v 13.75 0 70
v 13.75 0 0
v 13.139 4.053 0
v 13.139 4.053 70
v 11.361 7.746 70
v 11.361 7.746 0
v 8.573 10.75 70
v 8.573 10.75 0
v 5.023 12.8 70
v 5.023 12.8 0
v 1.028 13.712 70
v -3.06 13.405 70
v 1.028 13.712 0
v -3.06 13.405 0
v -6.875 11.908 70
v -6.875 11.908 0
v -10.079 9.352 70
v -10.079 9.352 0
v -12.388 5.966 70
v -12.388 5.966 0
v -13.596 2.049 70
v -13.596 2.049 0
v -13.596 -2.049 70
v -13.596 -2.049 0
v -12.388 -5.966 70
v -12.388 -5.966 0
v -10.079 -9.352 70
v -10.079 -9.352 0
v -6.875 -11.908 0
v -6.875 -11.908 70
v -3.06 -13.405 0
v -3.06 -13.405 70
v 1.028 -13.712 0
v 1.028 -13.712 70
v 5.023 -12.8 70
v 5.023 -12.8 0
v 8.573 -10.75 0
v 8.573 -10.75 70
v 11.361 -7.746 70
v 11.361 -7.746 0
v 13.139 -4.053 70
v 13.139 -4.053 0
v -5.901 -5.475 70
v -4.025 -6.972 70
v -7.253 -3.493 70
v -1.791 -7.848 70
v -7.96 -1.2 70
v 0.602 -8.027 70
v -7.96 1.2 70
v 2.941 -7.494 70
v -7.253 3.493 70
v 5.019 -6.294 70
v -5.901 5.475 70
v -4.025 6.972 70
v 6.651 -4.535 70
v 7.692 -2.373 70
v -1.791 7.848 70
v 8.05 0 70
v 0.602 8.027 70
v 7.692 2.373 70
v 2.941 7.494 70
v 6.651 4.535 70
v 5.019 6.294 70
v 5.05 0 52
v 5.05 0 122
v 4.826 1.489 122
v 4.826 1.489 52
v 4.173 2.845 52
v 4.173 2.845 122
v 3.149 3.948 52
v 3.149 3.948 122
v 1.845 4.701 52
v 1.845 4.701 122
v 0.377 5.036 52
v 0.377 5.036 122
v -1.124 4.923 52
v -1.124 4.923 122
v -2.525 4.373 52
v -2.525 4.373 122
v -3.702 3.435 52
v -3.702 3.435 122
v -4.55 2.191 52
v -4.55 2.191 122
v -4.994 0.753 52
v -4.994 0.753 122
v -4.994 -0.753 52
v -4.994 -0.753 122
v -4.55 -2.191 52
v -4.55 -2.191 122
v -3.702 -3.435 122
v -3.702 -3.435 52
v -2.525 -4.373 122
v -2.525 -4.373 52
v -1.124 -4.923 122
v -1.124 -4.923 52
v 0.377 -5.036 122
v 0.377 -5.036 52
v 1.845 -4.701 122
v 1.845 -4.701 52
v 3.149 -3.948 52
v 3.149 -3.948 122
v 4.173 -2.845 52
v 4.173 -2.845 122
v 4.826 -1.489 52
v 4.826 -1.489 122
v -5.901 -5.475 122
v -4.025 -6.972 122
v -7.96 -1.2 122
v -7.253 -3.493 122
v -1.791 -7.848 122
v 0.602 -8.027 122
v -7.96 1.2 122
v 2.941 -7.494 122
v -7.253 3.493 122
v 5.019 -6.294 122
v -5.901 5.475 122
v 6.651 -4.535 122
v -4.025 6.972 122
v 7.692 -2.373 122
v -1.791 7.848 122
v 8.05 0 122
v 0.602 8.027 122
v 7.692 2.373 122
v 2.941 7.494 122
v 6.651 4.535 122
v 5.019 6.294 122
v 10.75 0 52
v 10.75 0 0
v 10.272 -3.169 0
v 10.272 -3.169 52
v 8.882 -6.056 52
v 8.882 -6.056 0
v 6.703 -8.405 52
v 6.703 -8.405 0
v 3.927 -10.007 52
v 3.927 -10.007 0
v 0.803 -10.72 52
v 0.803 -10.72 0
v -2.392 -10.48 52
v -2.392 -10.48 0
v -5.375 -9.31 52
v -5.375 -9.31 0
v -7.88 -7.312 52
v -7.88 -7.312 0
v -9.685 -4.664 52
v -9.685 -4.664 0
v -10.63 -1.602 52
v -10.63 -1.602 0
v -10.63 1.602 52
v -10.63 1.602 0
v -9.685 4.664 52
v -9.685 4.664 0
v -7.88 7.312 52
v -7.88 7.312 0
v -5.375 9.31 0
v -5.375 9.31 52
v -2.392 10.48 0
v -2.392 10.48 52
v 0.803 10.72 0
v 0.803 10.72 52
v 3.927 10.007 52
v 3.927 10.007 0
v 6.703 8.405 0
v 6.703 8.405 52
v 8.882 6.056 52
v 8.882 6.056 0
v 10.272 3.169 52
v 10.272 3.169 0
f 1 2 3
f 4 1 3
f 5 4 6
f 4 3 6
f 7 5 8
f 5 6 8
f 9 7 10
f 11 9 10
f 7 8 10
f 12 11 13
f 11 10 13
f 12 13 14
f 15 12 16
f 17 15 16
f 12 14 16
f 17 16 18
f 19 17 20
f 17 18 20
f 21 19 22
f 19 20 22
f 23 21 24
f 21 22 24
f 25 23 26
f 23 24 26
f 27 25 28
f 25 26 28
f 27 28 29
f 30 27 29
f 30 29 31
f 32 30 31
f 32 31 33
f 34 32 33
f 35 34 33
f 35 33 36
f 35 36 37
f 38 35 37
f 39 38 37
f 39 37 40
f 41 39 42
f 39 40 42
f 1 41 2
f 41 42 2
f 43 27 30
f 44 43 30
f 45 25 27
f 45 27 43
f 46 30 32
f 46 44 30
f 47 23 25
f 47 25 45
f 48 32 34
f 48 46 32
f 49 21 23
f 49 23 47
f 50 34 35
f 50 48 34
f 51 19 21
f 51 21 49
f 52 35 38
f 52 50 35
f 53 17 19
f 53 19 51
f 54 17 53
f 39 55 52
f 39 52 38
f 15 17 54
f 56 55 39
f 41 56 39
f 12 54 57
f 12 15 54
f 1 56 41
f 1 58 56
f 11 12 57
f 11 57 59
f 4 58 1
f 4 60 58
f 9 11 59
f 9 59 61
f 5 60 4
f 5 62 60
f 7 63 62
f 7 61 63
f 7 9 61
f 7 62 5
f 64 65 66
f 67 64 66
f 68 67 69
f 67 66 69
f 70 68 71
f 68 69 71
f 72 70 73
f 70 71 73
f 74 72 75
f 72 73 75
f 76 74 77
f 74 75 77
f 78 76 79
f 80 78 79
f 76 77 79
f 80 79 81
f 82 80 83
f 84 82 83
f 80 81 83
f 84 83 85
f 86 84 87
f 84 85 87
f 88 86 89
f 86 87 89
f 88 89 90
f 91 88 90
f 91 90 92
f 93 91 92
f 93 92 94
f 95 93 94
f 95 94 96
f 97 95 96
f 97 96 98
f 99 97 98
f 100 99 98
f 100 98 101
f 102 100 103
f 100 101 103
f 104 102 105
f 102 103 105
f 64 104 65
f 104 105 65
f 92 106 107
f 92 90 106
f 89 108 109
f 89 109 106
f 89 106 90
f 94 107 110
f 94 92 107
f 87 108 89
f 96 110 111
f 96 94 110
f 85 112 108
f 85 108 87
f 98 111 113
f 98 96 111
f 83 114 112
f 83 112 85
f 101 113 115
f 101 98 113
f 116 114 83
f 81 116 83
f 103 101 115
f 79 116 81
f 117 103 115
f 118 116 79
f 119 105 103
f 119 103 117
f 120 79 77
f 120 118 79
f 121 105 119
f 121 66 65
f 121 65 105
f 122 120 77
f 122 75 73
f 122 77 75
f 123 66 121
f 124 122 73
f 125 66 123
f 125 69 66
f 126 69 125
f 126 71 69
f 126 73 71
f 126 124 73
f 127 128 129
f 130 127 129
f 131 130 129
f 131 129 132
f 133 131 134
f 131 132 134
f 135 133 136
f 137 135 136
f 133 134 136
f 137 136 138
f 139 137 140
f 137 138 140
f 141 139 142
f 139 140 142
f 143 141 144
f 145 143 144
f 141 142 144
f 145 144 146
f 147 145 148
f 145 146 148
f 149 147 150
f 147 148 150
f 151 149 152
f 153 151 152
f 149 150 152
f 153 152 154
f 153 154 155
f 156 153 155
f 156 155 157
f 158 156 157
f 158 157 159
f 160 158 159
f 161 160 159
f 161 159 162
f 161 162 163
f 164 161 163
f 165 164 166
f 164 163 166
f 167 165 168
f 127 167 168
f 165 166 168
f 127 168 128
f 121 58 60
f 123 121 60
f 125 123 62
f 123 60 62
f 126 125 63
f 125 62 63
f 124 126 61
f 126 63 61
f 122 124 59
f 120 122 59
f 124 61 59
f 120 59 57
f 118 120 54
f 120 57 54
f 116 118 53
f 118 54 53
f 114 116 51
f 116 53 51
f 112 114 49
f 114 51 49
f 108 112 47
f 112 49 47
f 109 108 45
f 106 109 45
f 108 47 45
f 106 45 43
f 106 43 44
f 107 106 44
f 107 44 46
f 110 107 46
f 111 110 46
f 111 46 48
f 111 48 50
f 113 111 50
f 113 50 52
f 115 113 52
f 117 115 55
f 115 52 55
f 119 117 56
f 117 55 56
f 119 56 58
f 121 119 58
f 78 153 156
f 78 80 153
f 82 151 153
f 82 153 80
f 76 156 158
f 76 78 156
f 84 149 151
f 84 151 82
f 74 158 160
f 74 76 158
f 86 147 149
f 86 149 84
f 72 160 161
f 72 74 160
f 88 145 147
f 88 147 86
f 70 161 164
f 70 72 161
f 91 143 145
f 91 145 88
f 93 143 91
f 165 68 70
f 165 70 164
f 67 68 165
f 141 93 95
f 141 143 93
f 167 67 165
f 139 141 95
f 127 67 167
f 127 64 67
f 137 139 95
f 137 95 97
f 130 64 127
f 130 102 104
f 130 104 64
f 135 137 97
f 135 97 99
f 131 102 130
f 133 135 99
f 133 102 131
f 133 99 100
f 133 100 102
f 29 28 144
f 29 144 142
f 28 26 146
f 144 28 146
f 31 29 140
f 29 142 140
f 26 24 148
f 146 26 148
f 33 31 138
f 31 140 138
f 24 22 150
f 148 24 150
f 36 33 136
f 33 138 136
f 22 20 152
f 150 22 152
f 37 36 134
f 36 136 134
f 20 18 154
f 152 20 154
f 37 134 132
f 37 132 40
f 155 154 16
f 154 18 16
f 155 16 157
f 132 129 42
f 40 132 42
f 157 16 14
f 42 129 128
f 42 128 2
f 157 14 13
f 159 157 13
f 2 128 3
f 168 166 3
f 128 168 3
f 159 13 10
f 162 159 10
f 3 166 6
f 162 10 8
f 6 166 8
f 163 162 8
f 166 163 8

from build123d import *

# Parameters (mm, degrees)
F0_R     = 13.75
F1_DEPTH = 70
F2_R     = 8.05
F3_DEPTH = 52
F4_R     = 10.75
F5_DEPTH = 52
F6_R     = 5.05
F7_DEPTH = 70


with BuildPart() as f1:
    # F0 (on Top) → F1 (new body)
    with BuildSketch(Plane.XY):
        Circle(F0_R)
    extrude(amount=F1_DEPTH)

    # F2 (on face) → F3 (join)
    with BuildSketch(Plane.XY.offset(70)):
        Circle(F2_R)
    extrude(amount=F3_DEPTH)

    # F4 (on face) → F5 (cut)
    with BuildSketch(Plane(origin=(0, 0, 0), x_dir=(1, 0, 0), z_dir=(0, 0, -1))):
        Circle(F4_R)
    extrude(amount=-F5_DEPTH, mode=Mode.SUBTRACT)

    # F6 (on face) → F7 (cut, through all)
    with BuildSketch(Plane.XY.offset(122)):
        Circle(F6_R)
    extrude(amount=-F7_DEPTH, mode=Mode.SUBTRACT)


solid = f1.part
